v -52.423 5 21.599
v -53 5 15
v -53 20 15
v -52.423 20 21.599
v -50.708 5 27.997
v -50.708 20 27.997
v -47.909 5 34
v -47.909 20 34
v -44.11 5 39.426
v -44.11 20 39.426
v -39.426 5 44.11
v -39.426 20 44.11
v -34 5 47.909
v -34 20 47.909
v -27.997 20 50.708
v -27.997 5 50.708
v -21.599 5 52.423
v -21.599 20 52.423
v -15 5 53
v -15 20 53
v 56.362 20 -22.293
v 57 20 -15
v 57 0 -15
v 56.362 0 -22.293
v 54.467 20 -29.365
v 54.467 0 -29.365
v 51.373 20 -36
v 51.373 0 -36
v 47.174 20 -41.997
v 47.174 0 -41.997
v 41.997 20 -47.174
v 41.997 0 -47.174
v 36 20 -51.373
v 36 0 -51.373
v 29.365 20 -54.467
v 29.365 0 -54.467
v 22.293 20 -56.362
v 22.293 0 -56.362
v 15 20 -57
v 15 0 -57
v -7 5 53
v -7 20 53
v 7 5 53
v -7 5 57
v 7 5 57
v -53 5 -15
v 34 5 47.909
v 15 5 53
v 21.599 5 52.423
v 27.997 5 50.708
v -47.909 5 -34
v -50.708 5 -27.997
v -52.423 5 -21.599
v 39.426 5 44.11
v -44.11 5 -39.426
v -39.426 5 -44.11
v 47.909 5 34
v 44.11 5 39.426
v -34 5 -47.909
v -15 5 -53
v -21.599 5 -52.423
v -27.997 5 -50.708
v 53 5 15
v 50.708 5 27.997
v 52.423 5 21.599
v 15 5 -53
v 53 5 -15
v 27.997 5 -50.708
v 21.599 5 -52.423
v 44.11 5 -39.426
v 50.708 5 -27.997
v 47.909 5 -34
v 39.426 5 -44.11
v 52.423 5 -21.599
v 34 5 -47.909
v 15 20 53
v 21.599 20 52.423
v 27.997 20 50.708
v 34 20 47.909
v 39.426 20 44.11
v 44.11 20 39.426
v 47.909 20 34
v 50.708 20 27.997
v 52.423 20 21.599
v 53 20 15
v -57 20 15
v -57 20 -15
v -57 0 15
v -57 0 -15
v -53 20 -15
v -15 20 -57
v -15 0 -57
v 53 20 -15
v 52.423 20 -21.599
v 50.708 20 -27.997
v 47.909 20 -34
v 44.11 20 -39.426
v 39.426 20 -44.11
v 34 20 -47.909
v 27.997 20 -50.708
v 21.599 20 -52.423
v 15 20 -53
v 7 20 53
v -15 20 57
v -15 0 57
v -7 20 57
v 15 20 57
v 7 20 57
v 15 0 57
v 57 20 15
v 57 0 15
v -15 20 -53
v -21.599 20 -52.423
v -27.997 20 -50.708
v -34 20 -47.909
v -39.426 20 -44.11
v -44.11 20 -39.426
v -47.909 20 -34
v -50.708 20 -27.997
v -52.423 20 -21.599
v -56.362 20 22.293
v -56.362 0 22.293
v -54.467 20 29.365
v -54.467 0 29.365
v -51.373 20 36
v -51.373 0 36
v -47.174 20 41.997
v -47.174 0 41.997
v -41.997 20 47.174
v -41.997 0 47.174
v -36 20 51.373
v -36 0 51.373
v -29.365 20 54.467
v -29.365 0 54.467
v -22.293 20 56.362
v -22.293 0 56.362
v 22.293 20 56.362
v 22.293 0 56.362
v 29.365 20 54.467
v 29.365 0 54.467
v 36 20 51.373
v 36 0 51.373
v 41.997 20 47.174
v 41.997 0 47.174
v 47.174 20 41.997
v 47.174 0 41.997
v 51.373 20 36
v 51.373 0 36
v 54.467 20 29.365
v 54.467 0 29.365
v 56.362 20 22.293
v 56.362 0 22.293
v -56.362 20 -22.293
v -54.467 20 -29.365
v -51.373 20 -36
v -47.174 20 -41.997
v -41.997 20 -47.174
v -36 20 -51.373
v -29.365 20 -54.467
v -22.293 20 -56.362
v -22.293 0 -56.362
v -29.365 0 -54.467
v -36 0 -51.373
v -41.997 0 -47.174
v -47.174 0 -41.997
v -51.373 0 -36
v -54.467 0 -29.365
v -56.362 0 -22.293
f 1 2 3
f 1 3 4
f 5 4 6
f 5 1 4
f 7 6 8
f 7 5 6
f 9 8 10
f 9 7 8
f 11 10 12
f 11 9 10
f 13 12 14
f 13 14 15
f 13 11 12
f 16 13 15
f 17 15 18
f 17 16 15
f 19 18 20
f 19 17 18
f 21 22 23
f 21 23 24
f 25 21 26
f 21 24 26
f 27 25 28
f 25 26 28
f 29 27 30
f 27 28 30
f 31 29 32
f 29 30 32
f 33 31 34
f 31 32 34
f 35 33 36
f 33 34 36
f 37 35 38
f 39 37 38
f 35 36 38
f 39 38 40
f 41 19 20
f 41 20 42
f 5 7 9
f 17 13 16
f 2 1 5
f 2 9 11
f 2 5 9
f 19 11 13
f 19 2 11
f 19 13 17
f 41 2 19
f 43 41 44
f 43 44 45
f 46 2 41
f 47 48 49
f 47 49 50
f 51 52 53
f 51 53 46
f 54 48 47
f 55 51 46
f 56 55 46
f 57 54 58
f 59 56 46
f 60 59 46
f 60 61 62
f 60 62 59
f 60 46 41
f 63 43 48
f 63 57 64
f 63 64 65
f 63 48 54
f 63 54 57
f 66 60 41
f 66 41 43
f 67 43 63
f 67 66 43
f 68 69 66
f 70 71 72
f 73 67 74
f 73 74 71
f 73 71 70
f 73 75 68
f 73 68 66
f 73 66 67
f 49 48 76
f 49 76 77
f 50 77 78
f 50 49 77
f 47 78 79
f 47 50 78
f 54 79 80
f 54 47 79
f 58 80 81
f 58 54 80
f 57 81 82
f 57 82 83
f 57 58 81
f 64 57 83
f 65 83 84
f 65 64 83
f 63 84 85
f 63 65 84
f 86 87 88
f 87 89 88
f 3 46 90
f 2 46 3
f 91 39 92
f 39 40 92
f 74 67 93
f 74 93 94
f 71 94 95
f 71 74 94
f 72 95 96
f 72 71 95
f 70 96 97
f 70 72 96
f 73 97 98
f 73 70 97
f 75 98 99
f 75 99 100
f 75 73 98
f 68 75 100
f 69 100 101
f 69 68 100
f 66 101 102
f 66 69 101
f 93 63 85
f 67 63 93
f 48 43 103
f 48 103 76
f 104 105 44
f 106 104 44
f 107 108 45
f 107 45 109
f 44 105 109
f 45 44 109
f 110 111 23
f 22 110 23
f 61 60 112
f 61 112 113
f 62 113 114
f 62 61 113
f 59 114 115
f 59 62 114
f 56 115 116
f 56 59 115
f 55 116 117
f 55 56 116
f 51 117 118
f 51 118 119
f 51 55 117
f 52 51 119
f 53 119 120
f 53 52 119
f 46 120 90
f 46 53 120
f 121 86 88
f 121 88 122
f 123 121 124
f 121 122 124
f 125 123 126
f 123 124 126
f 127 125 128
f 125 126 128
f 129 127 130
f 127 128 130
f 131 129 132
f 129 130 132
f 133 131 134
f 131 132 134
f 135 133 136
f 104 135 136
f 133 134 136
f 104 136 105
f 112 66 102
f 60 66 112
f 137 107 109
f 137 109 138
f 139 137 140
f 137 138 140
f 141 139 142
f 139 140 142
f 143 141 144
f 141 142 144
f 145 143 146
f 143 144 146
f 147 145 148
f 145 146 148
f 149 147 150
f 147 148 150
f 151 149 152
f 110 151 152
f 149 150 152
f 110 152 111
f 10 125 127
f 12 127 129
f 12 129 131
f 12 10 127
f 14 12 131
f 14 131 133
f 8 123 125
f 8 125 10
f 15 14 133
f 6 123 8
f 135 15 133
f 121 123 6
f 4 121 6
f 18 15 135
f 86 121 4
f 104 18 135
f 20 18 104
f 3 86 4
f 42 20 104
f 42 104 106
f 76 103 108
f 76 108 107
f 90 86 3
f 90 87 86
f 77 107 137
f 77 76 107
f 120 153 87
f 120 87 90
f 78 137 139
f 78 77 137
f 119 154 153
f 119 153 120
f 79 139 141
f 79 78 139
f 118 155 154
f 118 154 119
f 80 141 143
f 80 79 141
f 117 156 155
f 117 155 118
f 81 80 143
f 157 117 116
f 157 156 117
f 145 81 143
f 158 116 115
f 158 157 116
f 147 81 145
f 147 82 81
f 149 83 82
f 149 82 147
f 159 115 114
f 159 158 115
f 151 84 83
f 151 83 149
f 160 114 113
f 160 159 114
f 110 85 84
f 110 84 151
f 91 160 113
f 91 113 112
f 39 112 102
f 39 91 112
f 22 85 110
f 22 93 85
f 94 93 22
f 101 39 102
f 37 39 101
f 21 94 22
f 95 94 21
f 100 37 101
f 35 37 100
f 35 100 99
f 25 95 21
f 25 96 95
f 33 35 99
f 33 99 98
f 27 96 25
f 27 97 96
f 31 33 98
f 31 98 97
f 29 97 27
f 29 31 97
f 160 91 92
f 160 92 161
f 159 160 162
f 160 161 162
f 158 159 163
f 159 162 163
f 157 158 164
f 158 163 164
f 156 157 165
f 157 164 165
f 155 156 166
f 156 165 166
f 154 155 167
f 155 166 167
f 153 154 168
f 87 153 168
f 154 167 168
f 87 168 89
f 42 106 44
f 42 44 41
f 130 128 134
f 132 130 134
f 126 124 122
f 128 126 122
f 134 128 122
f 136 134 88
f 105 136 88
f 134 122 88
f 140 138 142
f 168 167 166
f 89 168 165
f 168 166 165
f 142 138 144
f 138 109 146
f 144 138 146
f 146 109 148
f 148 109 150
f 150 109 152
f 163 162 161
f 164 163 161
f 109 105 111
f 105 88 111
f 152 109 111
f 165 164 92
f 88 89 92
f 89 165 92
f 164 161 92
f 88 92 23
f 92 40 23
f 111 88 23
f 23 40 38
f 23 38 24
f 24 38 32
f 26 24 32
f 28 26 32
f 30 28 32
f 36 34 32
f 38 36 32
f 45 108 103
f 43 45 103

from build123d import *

# Parameters (mm, degrees)
BOSS_EXTRUDE1_DEPTH = 5
BOSS_EXTRUDE2_DEPTH = 15
SKETCH3_W           = 14
SKETCH3_H           = 4
CUT_EXTRUDE1_DEPTH  = 15


with BuildPart() as part:
    # Sketch1 → Boss-Extrude1 (new body)
    with BuildSketch(Plane(origin=(0, 0, 0), x_dir=(1, 0, 0), z_dir=(0, 1, 0))):
        with BuildLine():
            Line((-15, -57), (15, -57))
            ThreePointArc((15, -57), (44.69848481, -44.69848481), (57, -15))
            Line((57, -15), (57, 15))
            ThreePointArc((57, 15), (44.69848481, 44.69848481), (15, 57))
            Line((15, 57), (-15, 57))
            ThreePointArc((-15, 57), (-44.69848481, 44.69848481), (-57, 15))
            Line((-57, 15), (-57, -15))
            ThreePointArc((-57, -15), (-44.69848481, -44.69848481), (-15, -57))
        make_face()
    extrude(amount=BOSS_EXTRUDE1_DEPTH)

    # Sketch2 → Boss-Extrude2 (add)
    with BuildSketch(Plane(origin=(0, 5, 0), x_dir=(1, 0, 0), z_dir=(0, 1, 0))):
        with BuildLine():
            Line((57, -15), (57, 15))
            ThreePointArc((57, 15), (44.69848481, 44.69848481), (15, 57))
            Line((15, 57), (-15, 57))
            ThreePointArc((-15, 57), (-44.69848481, 44.69848481), (-57, 15))
            Line((-57, 15), (-57, -15))
            ThreePointArc((-57, -15), (-44.69848481, -44.69848481), (-15, -57))
            Line((-15, -57), (15, -57))
            ThreePointArc((15, -57), (44.69848481, -44.69848481), (57, -15))
        make_face()
        with BuildLine():
            Line((-53, 15), (-53, -15))
            ThreePointArc((-53, -15), (-41.870057685, -41.870057685), (-15, -53))
            Line((-15, -53), (15, -53))
            ThreePointArc((15, -53), (41.870057685, -41.870057685), (53, -15))
            Line((53, -15), (53, 15))
            ThreePointArc((53, 15), (41.870057685, 41.870057685), (15, 53))
            Line((15, 53), (-15, 53))
            ThreePointArc((-15, 53), (-41.870057685, 41.870057685), (-53, 15))
        make_face(mode=Mode.SUBTRACT)
    extrude(amount=BOSS_EXTRUDE2_DEPTH)

    # Sketch3 → Cut-Extrude1 (cut)
    with BuildSketch(Plane(origin=(0, 20, 0), x_dir=(1, 0, 0), z_dir=(0, 1, 0))):
        with Locations((0, -55)):
            Rectangle(SKETCH3_W, SKETCH3_H)
    extrude(amount=-CUT_EXTRUDE1_DEPTH, mode=Mode.SUBTRACT)


solid = part.part
